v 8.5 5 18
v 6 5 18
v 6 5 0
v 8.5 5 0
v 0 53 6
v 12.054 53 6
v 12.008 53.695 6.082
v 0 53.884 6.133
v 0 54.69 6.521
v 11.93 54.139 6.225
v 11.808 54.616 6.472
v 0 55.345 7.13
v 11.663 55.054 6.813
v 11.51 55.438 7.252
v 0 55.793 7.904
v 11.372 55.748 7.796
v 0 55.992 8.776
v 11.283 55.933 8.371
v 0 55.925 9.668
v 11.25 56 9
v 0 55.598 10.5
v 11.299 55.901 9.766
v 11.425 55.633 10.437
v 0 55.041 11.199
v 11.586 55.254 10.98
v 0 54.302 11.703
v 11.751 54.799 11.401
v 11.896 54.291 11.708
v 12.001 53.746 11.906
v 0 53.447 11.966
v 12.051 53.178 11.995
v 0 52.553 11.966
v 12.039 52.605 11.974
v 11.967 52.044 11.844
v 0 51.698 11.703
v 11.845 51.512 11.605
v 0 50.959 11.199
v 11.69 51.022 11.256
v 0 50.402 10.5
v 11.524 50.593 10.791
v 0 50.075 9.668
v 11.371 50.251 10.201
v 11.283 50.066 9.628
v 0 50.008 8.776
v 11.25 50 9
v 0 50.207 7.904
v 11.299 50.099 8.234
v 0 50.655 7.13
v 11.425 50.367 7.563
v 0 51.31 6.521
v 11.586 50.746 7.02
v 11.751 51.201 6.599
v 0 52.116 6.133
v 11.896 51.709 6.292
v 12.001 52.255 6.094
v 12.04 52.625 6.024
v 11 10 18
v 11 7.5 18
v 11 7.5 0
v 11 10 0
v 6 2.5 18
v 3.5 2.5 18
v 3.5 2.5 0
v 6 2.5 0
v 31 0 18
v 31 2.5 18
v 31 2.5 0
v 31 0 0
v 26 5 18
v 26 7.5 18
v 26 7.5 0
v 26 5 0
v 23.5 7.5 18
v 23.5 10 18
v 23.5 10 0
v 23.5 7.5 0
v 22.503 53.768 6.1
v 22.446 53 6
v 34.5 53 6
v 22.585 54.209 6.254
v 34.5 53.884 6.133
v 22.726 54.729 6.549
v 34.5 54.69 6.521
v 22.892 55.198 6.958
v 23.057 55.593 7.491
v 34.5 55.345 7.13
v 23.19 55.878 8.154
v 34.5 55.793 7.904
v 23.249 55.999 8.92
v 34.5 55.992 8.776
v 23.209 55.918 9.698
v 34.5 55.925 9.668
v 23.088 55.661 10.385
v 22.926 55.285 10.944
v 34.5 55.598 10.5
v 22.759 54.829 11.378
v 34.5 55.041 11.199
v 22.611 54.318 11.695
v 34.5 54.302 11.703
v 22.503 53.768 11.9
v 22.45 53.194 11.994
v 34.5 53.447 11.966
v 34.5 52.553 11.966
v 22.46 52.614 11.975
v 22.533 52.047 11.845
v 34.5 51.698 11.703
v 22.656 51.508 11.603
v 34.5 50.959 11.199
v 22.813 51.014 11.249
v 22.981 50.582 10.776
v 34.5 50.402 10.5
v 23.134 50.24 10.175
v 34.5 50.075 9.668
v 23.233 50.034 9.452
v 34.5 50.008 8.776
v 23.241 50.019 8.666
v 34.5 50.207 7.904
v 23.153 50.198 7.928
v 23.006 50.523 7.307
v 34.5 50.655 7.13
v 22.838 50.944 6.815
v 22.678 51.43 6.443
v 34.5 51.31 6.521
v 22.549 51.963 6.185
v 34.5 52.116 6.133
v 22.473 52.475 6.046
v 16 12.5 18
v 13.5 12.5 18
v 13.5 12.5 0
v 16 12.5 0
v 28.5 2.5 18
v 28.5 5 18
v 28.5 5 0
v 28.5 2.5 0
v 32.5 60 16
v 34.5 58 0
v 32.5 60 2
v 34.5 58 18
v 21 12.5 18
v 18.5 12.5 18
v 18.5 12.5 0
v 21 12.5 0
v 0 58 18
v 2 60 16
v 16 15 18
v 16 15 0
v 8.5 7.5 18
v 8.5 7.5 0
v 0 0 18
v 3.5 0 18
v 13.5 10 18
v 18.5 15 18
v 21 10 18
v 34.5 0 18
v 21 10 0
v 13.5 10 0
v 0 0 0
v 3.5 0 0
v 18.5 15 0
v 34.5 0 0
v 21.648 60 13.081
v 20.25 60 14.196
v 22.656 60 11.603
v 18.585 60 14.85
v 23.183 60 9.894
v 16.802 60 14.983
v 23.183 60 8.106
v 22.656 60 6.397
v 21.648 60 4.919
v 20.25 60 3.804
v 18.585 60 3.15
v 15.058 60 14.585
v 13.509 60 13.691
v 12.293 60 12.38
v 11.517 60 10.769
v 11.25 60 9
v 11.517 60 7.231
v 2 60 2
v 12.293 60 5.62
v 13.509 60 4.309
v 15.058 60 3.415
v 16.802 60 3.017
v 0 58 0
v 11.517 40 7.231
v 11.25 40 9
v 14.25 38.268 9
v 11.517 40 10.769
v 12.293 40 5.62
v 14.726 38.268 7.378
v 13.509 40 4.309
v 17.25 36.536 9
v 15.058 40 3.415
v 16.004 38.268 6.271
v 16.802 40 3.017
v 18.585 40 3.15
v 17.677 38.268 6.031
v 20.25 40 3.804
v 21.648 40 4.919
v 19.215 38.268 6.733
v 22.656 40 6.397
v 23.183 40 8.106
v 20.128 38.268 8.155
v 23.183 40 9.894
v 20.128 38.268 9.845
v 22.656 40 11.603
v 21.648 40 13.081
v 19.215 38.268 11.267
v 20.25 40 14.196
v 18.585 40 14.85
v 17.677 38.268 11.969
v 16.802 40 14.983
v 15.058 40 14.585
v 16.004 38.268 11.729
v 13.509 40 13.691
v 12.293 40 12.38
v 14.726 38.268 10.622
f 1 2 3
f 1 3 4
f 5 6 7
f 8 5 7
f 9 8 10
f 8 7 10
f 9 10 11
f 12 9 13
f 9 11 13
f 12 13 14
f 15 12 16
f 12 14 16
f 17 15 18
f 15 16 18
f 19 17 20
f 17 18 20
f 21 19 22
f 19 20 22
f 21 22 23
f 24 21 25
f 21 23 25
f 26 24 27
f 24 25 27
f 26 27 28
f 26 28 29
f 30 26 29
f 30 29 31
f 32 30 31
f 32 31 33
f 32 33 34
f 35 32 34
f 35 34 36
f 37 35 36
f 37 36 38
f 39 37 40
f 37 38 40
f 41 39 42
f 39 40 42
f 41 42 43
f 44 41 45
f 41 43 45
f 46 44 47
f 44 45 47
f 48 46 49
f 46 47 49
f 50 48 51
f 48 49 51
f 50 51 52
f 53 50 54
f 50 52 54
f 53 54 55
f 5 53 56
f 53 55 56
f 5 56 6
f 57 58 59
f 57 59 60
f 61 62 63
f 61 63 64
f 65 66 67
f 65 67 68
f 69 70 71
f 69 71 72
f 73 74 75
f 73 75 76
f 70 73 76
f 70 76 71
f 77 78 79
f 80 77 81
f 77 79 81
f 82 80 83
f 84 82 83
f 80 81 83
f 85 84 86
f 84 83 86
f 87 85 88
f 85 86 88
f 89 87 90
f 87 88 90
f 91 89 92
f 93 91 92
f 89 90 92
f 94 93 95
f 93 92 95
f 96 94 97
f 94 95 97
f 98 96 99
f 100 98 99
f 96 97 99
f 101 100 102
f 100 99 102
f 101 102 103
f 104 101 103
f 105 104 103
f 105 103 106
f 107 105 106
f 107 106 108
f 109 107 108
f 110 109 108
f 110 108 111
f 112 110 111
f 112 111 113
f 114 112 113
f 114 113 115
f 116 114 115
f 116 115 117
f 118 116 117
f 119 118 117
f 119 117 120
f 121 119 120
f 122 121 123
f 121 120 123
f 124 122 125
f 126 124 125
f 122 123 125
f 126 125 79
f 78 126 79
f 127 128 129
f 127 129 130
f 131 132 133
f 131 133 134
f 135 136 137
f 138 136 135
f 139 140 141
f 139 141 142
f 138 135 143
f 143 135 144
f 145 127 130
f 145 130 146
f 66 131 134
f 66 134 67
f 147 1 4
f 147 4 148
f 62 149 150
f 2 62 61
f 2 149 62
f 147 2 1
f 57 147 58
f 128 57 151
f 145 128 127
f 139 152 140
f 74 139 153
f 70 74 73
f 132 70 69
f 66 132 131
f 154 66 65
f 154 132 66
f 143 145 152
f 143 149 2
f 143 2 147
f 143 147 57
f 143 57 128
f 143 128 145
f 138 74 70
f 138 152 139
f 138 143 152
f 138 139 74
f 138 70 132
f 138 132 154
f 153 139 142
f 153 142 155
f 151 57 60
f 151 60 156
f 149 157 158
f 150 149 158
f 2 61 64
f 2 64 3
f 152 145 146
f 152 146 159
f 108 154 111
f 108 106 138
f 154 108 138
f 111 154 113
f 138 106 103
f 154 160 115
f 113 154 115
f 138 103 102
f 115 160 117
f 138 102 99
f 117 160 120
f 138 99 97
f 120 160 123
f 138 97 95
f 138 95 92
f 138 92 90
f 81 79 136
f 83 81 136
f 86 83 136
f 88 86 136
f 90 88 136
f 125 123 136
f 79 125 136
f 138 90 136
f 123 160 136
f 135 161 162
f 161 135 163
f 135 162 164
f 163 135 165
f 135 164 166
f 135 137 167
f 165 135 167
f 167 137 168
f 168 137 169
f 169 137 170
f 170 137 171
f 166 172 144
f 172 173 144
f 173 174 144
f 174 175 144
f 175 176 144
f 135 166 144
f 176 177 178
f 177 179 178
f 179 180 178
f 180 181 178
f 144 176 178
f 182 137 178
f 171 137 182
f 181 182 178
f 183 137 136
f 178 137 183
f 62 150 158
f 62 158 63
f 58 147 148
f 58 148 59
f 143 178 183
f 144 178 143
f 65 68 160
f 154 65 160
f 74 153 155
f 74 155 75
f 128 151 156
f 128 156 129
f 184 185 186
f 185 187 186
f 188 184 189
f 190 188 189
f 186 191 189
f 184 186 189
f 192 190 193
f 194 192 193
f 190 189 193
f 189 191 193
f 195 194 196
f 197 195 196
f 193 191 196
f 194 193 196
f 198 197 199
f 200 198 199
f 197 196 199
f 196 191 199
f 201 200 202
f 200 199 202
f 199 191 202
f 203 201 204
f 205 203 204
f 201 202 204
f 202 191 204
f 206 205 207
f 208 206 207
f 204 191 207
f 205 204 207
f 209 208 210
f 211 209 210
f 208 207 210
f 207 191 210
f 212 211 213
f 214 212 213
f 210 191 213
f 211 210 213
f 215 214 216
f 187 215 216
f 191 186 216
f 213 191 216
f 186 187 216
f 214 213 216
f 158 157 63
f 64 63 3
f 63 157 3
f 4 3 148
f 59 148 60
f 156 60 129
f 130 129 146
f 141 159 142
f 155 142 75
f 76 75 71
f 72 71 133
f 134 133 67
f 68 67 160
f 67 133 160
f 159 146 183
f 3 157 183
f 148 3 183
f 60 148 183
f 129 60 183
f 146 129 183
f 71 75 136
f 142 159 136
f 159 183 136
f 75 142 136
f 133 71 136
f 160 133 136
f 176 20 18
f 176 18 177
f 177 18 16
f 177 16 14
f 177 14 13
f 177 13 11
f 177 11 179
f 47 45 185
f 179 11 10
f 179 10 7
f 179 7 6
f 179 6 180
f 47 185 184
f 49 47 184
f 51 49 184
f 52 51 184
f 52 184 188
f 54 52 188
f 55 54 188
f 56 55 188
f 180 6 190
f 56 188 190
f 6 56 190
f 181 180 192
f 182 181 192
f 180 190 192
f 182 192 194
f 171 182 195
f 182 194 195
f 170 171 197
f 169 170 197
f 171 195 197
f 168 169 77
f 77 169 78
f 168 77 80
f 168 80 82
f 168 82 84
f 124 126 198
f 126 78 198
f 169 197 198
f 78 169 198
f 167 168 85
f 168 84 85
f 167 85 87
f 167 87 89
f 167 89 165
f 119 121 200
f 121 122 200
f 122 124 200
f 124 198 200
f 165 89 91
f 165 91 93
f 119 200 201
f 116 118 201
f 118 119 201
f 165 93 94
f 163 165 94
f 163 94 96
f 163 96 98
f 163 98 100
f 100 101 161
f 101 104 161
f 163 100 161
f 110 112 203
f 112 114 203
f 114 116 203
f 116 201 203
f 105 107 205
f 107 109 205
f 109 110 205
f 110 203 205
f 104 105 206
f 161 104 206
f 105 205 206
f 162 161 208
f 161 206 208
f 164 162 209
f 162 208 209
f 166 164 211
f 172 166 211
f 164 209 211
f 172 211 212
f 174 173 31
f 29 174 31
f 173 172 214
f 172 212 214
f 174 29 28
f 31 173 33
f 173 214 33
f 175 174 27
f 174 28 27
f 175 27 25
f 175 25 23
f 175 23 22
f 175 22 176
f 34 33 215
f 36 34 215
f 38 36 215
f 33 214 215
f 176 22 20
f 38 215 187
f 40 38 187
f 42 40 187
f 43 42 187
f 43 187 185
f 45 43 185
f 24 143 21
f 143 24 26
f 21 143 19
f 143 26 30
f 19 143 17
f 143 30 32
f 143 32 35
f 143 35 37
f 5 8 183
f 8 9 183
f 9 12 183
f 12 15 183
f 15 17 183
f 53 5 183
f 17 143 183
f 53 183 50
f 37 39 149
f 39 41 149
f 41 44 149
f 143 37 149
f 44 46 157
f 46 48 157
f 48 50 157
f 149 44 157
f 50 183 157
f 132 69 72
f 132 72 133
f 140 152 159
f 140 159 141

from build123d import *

# Parameters (mm, degrees)
BOSS_EXTRUDE1_DEPTH = 18
SKETCH3_R           = 3
CUT_EXTRUDE1_DEPTH  = 35.5
CHAMFER2_SIZE       = 2


with BuildPart() as part:
    # Sketch1 → Boss-Extrude1 (new body)
    with BuildSketch(Plane.XY):
        Polygon((0, 0), (3.5, 0), (3.5, 2.5), (6, 2.5), (6, 5), (8.5, 5), (8.5, 7.5), (11, 7.5), (11, 10), (13.5, 10), (13.5, 12.5), (16, 12.5), (16, 15), (18.5, 15), (18.5, 12.5), (21, 12.5), (21, 10), (23.5, 10), (23.5, 7.5), (26, 7.5), (26, 5), (28.5, 5), (28.5, 2.5), (31, 2.5), (31, 0), (34.5, 0), (34.5, 60), (0, 60), align=None)
    extrude(amount=BOSS_EXTRUDE1_DEPTH)

    # Sketch2 → Cut-Revolve1 (revolve, cut)
    with BuildSketch(Plane.XY.offset(9)):
        Polygon((11.25, 60), (11.25, 40), (17.25, 36.535898385), (17.25, 60), align=None)
    revolve(axis=Axis((17.25, 60, 9), (0, -1, 0)), mode=Mode.SUBTRACT)

    # Sketch3 → Cut-Extrude1 (cut, through all)
    with BuildSketch(Plane(origin=(34.5, 0, 0), x_dir=(0, 0, -1), z_dir=(1, 0, 0))):
        with Locations((-9, 53)):
            Circle(SKETCH3_R)
    extrude(amount=-CUT_EXTRUDE1_DEPTH, mode=Mode.SUBTRACT)

    # Chamfer2
    chamfer2_edges = [part.edges().sort_by_distance(p)[0] for p in [
        (17.25, 60, 18),
        (17.25, 60, 0),
        (0, 60, 9),
        (34.5, 60, 9),
    ]]
    chamfer(chamfer2_edges, length=CHAMFER2_SIZE)


solid = part.part
